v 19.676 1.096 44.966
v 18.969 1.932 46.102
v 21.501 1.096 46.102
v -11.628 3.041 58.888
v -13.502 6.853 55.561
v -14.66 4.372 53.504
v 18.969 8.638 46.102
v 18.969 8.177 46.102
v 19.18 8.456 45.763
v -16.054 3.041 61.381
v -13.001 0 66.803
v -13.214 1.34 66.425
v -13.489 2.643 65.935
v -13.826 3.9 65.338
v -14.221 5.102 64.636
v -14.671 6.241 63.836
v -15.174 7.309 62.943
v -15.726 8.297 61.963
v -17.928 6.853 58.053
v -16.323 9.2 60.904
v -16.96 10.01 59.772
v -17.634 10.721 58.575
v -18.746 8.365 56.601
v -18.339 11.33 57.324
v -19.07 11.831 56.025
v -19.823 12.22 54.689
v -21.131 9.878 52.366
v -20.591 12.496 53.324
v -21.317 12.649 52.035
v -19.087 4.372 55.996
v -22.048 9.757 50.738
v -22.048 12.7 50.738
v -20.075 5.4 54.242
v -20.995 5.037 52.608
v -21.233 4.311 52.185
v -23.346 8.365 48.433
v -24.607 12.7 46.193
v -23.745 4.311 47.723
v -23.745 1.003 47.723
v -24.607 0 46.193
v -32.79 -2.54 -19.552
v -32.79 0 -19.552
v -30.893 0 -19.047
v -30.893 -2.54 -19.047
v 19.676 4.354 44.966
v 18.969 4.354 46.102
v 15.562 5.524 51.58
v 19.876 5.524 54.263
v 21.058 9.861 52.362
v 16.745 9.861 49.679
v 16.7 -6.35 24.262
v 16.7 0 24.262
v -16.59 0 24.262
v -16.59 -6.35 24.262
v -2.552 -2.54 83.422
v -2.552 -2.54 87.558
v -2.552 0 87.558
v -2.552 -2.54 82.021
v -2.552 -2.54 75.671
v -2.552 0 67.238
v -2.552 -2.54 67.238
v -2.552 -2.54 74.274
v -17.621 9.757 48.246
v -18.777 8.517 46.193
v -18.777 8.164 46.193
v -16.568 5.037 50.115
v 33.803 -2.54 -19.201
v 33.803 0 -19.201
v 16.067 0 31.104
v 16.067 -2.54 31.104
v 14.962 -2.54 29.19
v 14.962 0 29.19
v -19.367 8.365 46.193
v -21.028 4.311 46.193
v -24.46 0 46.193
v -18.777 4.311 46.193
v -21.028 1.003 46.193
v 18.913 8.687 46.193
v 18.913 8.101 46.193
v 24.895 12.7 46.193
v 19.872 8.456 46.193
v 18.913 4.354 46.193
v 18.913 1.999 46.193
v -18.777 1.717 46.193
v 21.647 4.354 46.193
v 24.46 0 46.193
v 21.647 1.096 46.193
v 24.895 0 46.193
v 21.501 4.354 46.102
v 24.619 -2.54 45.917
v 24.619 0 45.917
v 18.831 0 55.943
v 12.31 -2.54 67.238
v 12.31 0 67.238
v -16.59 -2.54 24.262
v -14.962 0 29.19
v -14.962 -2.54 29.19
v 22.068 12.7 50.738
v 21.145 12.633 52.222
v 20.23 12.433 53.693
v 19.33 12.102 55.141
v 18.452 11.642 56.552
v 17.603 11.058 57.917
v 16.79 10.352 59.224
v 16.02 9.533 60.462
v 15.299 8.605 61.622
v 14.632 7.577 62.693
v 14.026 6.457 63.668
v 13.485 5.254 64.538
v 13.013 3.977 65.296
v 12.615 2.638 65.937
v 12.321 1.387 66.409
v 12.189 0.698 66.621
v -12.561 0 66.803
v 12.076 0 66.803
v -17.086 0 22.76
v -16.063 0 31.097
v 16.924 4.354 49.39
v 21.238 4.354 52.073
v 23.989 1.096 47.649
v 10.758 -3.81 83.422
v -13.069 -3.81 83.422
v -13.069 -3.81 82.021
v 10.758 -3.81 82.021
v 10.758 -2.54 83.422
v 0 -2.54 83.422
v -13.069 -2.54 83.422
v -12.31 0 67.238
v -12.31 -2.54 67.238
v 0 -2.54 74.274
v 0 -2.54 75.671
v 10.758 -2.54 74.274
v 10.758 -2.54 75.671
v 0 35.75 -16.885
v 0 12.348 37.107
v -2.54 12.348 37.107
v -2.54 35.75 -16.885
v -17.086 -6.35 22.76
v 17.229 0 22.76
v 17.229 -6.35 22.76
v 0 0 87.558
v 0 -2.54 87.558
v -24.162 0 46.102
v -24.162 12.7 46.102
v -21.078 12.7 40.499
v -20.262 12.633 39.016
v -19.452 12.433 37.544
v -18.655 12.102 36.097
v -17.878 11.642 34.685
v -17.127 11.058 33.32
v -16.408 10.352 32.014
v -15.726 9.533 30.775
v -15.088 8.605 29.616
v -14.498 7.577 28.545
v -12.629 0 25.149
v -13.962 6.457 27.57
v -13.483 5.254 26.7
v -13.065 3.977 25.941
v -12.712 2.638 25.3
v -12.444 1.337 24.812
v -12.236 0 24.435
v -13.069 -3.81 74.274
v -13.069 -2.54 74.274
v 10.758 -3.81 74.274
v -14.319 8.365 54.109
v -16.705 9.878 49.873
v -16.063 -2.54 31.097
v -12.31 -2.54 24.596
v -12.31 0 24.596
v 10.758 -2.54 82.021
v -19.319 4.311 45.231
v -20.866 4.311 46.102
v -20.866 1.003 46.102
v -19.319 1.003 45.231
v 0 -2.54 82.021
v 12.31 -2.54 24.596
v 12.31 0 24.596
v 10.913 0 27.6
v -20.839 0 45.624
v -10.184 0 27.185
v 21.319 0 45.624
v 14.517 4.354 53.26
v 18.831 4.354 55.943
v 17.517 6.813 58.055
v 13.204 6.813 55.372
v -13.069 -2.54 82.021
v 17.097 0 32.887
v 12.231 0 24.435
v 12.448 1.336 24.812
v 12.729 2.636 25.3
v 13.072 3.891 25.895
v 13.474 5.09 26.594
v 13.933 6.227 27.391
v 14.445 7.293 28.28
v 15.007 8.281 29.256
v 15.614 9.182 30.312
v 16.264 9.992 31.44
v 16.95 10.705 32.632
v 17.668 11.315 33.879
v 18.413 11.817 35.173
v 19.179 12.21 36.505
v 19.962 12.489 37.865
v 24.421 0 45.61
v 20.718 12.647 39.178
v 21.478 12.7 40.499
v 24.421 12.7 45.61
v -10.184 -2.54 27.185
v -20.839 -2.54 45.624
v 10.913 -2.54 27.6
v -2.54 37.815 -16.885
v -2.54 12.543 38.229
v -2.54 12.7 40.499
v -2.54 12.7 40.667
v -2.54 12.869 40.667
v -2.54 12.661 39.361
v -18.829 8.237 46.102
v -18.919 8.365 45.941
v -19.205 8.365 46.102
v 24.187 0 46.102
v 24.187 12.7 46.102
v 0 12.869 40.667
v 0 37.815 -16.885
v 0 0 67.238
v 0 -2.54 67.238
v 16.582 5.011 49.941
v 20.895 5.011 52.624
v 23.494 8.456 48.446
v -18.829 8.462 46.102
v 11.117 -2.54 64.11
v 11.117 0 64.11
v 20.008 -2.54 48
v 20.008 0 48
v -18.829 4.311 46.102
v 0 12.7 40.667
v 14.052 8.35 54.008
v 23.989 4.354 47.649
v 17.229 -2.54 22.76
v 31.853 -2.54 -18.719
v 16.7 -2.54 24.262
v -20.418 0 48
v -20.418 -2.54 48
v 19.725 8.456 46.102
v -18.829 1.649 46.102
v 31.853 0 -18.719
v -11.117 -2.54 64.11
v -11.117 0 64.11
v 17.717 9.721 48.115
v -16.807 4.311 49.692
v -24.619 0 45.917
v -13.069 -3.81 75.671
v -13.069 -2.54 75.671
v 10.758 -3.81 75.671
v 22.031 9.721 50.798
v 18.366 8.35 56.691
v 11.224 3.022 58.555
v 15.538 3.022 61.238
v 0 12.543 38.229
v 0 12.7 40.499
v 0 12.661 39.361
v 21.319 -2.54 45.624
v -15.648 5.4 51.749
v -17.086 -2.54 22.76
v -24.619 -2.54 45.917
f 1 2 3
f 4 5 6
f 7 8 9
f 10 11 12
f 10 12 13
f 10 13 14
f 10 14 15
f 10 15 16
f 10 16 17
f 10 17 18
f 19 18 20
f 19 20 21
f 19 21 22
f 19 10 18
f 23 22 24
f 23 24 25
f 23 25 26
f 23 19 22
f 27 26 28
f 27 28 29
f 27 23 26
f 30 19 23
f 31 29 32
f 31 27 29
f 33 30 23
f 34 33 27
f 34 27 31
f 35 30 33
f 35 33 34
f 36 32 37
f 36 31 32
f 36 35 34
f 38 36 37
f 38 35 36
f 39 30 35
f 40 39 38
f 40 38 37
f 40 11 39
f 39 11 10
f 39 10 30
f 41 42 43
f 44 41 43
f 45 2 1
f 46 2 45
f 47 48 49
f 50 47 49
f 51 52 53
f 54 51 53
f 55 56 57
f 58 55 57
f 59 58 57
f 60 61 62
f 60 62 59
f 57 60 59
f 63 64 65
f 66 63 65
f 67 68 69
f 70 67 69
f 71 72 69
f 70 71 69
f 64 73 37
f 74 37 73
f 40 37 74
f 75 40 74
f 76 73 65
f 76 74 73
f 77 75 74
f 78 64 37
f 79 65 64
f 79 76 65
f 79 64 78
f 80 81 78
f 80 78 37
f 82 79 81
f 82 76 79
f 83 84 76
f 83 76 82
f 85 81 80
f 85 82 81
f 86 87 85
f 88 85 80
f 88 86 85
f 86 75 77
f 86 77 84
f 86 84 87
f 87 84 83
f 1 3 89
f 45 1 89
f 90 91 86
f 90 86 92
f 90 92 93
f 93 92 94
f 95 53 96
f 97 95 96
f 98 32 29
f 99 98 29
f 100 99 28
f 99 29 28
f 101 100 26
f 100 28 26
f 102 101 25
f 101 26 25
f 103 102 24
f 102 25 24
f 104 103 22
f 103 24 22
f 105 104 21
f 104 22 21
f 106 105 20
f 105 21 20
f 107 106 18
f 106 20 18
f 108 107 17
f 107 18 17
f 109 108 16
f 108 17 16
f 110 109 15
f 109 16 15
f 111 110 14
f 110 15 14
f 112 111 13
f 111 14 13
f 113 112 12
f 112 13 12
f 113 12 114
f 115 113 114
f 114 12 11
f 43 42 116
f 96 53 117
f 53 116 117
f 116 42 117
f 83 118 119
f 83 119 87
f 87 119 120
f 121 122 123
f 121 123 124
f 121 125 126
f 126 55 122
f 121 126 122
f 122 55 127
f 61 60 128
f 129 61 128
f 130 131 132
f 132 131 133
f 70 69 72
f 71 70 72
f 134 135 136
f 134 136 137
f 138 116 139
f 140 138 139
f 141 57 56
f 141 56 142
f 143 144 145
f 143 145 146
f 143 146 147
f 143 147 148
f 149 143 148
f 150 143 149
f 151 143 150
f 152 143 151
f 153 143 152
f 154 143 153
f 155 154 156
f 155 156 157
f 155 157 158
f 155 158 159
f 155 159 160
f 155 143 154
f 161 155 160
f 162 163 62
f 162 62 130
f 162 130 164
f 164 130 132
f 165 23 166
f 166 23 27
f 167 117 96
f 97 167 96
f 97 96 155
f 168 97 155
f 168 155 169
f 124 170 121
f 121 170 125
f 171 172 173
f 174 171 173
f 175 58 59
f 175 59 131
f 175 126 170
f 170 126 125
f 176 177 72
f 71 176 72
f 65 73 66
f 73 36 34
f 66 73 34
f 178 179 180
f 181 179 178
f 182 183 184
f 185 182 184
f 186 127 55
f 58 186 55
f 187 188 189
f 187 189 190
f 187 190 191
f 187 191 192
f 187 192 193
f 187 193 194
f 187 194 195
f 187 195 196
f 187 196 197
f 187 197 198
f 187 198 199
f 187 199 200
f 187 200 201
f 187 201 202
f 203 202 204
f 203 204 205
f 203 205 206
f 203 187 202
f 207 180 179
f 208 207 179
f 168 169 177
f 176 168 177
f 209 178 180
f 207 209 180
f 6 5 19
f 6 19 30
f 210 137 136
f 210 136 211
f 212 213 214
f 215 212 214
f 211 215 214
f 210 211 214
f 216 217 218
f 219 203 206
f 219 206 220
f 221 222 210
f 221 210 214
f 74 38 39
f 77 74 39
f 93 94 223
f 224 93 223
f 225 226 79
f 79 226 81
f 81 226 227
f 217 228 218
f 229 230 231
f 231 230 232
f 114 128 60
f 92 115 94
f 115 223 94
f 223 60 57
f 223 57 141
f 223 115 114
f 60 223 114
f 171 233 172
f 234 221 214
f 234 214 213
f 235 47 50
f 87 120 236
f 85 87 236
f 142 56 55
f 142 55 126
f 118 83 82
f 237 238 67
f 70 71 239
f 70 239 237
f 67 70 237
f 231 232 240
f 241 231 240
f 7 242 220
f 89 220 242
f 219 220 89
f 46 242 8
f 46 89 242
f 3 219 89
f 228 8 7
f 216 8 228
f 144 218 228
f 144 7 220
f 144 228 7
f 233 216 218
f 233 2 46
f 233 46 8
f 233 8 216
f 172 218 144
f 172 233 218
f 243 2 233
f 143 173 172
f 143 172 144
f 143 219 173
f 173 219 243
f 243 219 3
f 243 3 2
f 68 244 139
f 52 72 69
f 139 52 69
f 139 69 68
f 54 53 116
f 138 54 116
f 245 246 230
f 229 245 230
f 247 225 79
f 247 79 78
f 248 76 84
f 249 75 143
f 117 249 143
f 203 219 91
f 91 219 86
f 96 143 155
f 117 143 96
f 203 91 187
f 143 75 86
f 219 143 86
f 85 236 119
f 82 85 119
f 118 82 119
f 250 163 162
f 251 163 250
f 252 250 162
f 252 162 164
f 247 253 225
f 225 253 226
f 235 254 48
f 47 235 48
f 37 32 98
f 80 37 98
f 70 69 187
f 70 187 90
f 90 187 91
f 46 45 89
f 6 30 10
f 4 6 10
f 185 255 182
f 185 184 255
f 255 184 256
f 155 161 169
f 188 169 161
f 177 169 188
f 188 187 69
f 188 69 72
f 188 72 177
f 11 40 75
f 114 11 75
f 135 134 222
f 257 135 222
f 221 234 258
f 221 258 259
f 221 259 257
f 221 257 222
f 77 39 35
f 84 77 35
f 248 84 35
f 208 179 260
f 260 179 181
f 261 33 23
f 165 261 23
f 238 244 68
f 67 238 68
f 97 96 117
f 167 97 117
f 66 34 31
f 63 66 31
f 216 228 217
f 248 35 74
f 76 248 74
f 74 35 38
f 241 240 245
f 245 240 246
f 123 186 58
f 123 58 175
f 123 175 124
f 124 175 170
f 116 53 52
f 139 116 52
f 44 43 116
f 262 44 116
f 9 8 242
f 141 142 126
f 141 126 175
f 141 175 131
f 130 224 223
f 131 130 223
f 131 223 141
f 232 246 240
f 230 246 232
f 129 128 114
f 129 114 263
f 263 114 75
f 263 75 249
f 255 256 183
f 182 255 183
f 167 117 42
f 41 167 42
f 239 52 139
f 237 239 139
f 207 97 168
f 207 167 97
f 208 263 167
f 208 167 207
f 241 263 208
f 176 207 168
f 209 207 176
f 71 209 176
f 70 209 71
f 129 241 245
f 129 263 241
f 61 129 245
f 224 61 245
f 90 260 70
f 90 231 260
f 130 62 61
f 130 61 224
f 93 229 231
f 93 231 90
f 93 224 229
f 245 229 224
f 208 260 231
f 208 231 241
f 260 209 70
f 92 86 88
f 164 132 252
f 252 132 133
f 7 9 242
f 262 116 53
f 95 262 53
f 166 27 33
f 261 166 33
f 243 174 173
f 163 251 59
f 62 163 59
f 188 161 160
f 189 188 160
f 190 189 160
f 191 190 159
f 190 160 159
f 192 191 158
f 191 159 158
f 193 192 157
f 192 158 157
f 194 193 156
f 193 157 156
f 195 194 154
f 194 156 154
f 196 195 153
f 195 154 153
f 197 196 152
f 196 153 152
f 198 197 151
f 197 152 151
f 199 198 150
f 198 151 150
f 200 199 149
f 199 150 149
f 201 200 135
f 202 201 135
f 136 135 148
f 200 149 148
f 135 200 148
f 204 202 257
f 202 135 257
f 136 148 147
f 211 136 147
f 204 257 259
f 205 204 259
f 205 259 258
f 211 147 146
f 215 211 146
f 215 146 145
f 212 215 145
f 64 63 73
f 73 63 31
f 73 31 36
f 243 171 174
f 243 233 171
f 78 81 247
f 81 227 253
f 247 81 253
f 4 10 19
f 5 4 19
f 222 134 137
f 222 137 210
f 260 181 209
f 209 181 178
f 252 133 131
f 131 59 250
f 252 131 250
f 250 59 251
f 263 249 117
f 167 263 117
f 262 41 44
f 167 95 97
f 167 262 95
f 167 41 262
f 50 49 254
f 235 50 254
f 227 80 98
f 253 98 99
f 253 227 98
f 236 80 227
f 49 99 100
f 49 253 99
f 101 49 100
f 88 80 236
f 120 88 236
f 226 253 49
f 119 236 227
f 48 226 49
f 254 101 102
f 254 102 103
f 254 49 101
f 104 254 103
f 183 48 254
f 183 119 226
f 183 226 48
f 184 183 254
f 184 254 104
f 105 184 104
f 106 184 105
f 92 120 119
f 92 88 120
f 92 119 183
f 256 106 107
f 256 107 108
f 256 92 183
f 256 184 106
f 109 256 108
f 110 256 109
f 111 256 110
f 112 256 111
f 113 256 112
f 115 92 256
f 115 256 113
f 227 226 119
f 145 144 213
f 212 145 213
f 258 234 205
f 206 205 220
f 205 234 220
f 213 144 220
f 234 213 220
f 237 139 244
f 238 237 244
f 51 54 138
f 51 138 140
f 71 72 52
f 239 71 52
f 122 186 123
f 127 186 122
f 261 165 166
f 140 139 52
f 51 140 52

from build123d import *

# Parameters (mm, degrees)
F1_DEPTH    = 2.54
F2_DEPTH    = 6.35
F3_DEPTH    = 2.54
F5_DEPTH    = 12.7
F6_T1_DEPTH = 64.7979646342
F6_T3_DEPTH = 40.6008481475
F8_DEPTH    = 12.7
F9_T1_DEPTH = 104.7890423645
F12_DEPTH   = 2.54
F13_DEPTH   = 5.08
F14_DEPTH   = 5.08
F16_DEPTH   = 2.54
F17_W       = 2.5518944021
F17_H       = 2.54
F18_DEPTH   = 20.32
F19_W       = 10.5172891635
F19_H       = 1.4007464051
F19_W_2     = 10.7583077624
F19_W_3     = 2.5518944021
F19_H_2     = 1.397
F20_DEPTH   = 1.27


# Not quite as in the source:
# - a fillet or chamfer that OpenCascade refuses, or shapes differently, is made with other operations: its cross-section is extruded or revolved along the edge and cut away or added
# - a feature names something its author has since deleted; it is built from what else it names


with BuildPart() as f1:
    # F0 (on Front) → F1 (new body)
    with BuildSketch(Plane.XZ):
        Polygon((-12.3096870905, 24.5958147295), (12.3096870905, 24.5958147295), (14.9623812482, 29.1904157876), (16.0672812482, 31.1041587249), (24.619374181, 45.9168181956), (12.3096870905, 67.2378216616), (-12.3096870905, 67.2378216616), (-24.619374181, 45.9168181956), (-16.063203778, 31.0970963393), (-14.9623812482, 29.1904157876), align=None)
        Polygon((-20.4179584605, 47.9999661041), (-11.1165930793, 64.1104035241), (11.1165930793, 64.1104035241), (20.0077917219, 47.9999661041), (21.3189943773, 45.6241280226), (10.9129743139, 27.6003725681), (-10.1836063763, 27.1850443882), (-20.8387417213, 45.6241280226), (-21.3144036201, 46.4472775415), align=None, mode=Mode.SUBTRACT)
    extrude(amount=F1_DEPTH)

    # F0 (on Front) → F3 (join)
    with BuildSketch(Plane.XZ):
        Polygon((20.0077917219, 47.9999661041), (-20.4179584605, 47.9999661041), (-21.3144036201, 46.4472775415), (-20.8387417213, 45.6241280226), (21.3189943773, 45.6241280226), align=None)
    extrude(amount=F3_DEPTH)

    # F4 (on Front) → F5 (join)
    with BuildSketch(Plane.XZ):
        Polygon((-24.6073901653, 46.1928248405), (24.8951986432, 46.1928248405), (12.076173909, 66.8027698994), (-13.0007863045, 66.8027698994), align=None)
    extrude(amount=-F5_DEPTH)

    # F6: fillet of radius 16.51 on 1 edges, made by hand

    # F6_s2 → F6_t1 (cut)
    with BuildSketch(Plane.YZ.offset(-12.5608644411)):
        with BuildLine():
            ThreePointArc((12.7, 50.7383993857), (9.1415095645, 60.9774667261), (0, 66.8027698994))
            Line((0, 66.8027698994), (12.7, 66.8027698994))
            Line((12.7, 66.8027698994), (12.7, 50.7383993857))
        make_face()
    extrude(amount=F6_T1_DEPTH, mode=Mode.SUBTRACT)

    # F6_s4 → F6_t3 (cut)
    with BuildSketch(Plane.YZ.offset(-53.1617125886)):
        with BuildLine():
            ThreePointArc((12.7, 50.7383993857), (9.1415095645, 60.9774667261), (0, 66.8027698994))
            Line((0, 66.8027698994), (12.7, 66.8027698994))
            Line((12.7, 66.8027698994), (12.7, 50.7383993857))
        make_face()
    extrude(amount=F6_T3_DEPTH, mode=Mode.SUBTRACT)

    # F7 (on face) → F8 (join)
    with BuildSketch(Plane.XZ):
        Polygon((24.1872295737, 46.1016893387), (-24.1620466113, 46.1016893387), (-12.2359395027, 24.4347602129), (12.2312502936, 24.4347602129), (24.4206115603, 45.6104800105), align=None)
    extrude(amount=-F8_DEPTH)

    # F9: fillet of radius 16.51 on 1 edges, made by hand

    # F9_s2 → F9_t1 (cut)
    with BuildSketch(Plane.YZ.offset(-52.3968657869)):
        with BuildLine():
            ThreePointArc((0, 24.4347602129), (9.1415095645, 30.2600633862), (12.7, 40.4991307266))
            Line((12.7, 40.4991307266), (12.7, 24.4347602129))
            Line((12.7, 24.4347602129), (0, 24.4347602129))
        make_face()
    extrude(amount=F9_T1_DEPTH, mode=Mode.SUBTRACT)

    # F11 (on face) + F10 (on face) → F13 (cut)
    with BuildSketch(Plane(origin=(-38.4324941113, 0, 21.6434703373), x_dir=(0, -1, 0), z_dir=(-0.8713313746, 0, 0.4906950536))):
        Polygon((-4.3718703091, 39.4256524742), (-3.040788928, 45.6056557596), (-6.8525229581, 41.7865514755), align=None)
        Polygon((-5.4004341364, 37.411943078), (-8.3651151508, 40.1200354099), (-9.8777078092, 35.2593585849), align=None)
        Polygon((-5.0374120474, 35.5371125042), (-9.7567010671, 33.3913478812), (-8.3651151508, 30.7458732277), align=None)
        Polygon((-1.0033984436, 29.9311615527), (-4.3113664724, 35.0510440767), (-4.3113664724, 29.9311615527), align=None)
    with BuildSketch(Plane(origin=(38.6673789122, 0, 24.0504322194), x_dir=(0, 1, 0), z_dir=(0.8491479072, 0, 0.5281551209))):
        Polygon((6.8130241707, 40.0453992188), (3.022192046, 43.7935963273), (4.3540487314, 37.5584534102), align=None)
        Polygon((4.3540487314, 27.7913156897), (4.3540487314, 33.0006070435), (1.0958878556, 27.7913156897), align=None)
        Polygon((9.7206383943, 31.4991533315), (5.0109082768, 33.6494068058), (8.4560297574, 28.7292634302), align=None)
        Polygon((9.860817343, 33.3406813443), (8.3504421636, 38.4387634695), (5.5238169231, 35.5799859143), align=None)
    extrude(amount=-F13_DEPTH, dir=(-0.8713313746, 0, 0.4906950536), mode=Mode.SUBTRACT)

    # F10 (on face) → F14 (cut)
    with BuildSketch(Plane(origin=(38.6673789122, 0, 24.0504322194), x_dir=(0, 1, 0), z_dir=(0.8491479072, 0, 0.5281551209))):
        Polygon((9.860817343, 33.3406813443), (8.3504421636, 38.4387634695), (5.5238169231, 35.5799859143), align=None)
        Polygon((9.7206383943, 31.4991533315), (5.0109082768, 33.6494068058), (8.4560297574, 28.7292634302), align=None)
        Polygon((4.3540487314, 27.7913156897), (4.3540487314, 33.0006070435), (1.0958878556, 27.7913156897), align=None)
        Polygon((6.8130241707, 40.0453992188), (3.022192046, 43.7935963273), (4.3540487314, 37.5584534102), align=None)
    extrude(amount=-F14_DEPTH, mode=Mode.SUBTRACT)

    # F15 (on Right) → F16 (join)
    with BuildSketch(Plane.YZ):
        Polygon((37.8151386976, -16.8852526695), (12.8690572456, 40.6673364341), (10.8043896034, 40.6673364341), (35.7504710555, -16.8852526695), align=None)
    extrude(amount=-F16_DEPTH)

    # F17 (on face) → F18 (join)
    with BuildSketch(Plane.XY.offset(67.2378216616)):
        with Locations((-1.2759472011, -1.27)):
            Rectangle(F17_W, F17_H)
    extrude(amount=F18_DEPTH)

    # F19 (on face) → F20 (join)
    with BuildSketch(Plane.XZ.offset(2.54)):
        with Locations((-7.8105389839, 82.721490413)):
            Rectangle(F19_W, F19_H)
        with Locations((5.3791538812, 82.721490413)):
            Rectangle(F19_W_2, F19_H)
        with Locations((-1.2759472011, 82.721490413)):
            Rectangle(F19_W_3, F19_H)
        with Locations((-7.8105389839, 74.9725780115)):
            Rectangle(F19_W, F19_H_2)
        with Locations((-1.2759472011, 74.9725780115)):
            Rectangle(F19_W_3, F19_H_2)
        with Locations((5.3791538812, 74.9725780115)):
            Rectangle(F19_W_2, F19_H_2)
    extrude(amount=F20_DEPTH)


with BuildPart() as f2:
    # F0 (on Front) → F2 (new body)
    with BuildSketch(Plane.XZ):
        Polygon((17.2293611918, 22.7602638308), (16.6998734149, 24.2621239926), (-16.5899691079, 24.2621239926), (-17.085964367, 22.7602638308), align=None)
    extrude(amount=F2_DEPTH)


with BuildPart() as f12:
    # F0 (on Front) → F12 (new body)
    with BuildSketch(Plane.XZ):
        Polygon((-16.5899691079, 24.2621239926), (-14.9623812482, 29.1904157876), (-16.063203778, 31.0970963393), (-32.79035625, -19.5522666397), (-30.8930026501, -19.0470727638), (-17.085964367, 22.7602638308), align=None)
    extrude(amount=F12_DEPTH)


with BuildPart() as f12b:
    # F0 (on Front) → F12, piece 2 (new body)
    with BuildSketch(Plane.XZ):
        Polygon((16.0672812482, 31.1041587249), (14.9623812482, 29.1904157876), (16.6998734149, 24.2621239926), (17.2293611918, 22.7602638308), (31.85317493, -18.7193023163), (33.8026146141, -19.2010452842), align=None)
    extrude(amount=F12_DEPTH)


solid = Compound([f1.part, f2.part, f12.part, f12b.part])
